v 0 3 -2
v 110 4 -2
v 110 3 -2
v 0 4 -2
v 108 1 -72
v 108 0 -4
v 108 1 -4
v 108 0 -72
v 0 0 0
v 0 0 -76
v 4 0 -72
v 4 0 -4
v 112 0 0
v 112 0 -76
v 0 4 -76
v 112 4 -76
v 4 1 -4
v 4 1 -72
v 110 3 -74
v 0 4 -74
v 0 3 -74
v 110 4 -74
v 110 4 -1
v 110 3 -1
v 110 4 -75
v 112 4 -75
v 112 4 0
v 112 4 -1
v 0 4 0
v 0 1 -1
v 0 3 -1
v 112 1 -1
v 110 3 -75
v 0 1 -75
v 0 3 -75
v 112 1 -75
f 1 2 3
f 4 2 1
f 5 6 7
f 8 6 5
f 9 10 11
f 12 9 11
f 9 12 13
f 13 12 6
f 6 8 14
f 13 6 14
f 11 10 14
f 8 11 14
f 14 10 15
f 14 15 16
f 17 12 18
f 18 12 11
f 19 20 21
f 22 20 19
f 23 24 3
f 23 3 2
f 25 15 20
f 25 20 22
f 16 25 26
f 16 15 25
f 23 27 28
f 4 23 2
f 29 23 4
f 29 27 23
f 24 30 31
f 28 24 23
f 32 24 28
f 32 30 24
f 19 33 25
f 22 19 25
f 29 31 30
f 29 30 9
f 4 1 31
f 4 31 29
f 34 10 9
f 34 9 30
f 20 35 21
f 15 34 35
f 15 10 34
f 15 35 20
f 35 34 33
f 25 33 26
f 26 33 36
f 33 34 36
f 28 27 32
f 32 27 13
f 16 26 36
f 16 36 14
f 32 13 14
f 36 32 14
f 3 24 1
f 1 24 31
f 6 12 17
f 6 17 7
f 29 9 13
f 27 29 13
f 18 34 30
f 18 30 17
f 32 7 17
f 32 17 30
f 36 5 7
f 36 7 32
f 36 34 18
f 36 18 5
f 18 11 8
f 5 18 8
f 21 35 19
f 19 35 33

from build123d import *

# Parameters (mm, degrees)
CROQUIS1_W              = 112
CROQUIS1_H              = 76
CROQUIS1_W_2            = 104
CROQUIS1_H_2            = 68
SALIENTE_EXTRUIR3_DEPTH = 1
CROQUIS2_W              = 112
CROQUIS2_H              = 1
SALIENTE_EXTRUIR4_DEPTH = 3
CROQUIS3_W              = 110
CROQUIS3_H              = 1
SALIENTE_EXTRUIR7_DEPTH = 1
CROQUIS5_W              = 110
CROQUIS5_H              = 1
SALIENTE_EXTRUIR8_DEPTH = 1


with BuildPart() as part:
    # Croquis1 → Saliente-Extruir3 (new body)
    with BuildSketch(Plane(origin=(0, 0, 0), x_dir=(1, 0, 0), z_dir=(0, 1, 0))):
        with Locations((56, 38)):
            Rectangle(CROQUIS1_W, CROQUIS1_H)
        with Locations((56, 38)):
            Rectangle(CROQUIS1_W_2, CROQUIS1_H_2, mode=Mode.SUBTRACT)
    extrude(amount=SALIENTE_EXTRUIR3_DEPTH)

    # Croquis2 → Saliente-Extruir4 (add)
    with BuildSketch(Plane(origin=(0, 1, 0), x_dir=(1, 0, 0), z_dir=(0, 1, 0))):
        with Locations((56, 75.5)):
            Rectangle(CROQUIS2_W, CROQUIS2_H)
        with Locations((56, 0.5)):
            Rectangle(CROQUIS2_W, CROQUIS2_H)
    extrude(amount=SALIENTE_EXTRUIR4_DEPTH)

    # Croquis3 → Saliente-Extruir7 (add)
    with BuildSketch(Plane(origin=(0, 0, -1), x_dir=(-1, 0, 0), z_dir=(0, 0, -1))):
        with Locations((-55, 3.5)):
            Rectangle(CROQUIS3_W, CROQUIS3_H)
    extrude(amount=SALIENTE_EXTRUIR7_DEPTH)

    # Croquis5 → Saliente-Extruir8 (add)
    with BuildSketch(Plane.XY.offset(-75)):
        with Locations((55, 3.5)):
            Rectangle(CROQUIS5_W, CROQUIS5_H)
    extrude(amount=SALIENTE_EXTRUIR8_DEPTH)


solid = part.part
